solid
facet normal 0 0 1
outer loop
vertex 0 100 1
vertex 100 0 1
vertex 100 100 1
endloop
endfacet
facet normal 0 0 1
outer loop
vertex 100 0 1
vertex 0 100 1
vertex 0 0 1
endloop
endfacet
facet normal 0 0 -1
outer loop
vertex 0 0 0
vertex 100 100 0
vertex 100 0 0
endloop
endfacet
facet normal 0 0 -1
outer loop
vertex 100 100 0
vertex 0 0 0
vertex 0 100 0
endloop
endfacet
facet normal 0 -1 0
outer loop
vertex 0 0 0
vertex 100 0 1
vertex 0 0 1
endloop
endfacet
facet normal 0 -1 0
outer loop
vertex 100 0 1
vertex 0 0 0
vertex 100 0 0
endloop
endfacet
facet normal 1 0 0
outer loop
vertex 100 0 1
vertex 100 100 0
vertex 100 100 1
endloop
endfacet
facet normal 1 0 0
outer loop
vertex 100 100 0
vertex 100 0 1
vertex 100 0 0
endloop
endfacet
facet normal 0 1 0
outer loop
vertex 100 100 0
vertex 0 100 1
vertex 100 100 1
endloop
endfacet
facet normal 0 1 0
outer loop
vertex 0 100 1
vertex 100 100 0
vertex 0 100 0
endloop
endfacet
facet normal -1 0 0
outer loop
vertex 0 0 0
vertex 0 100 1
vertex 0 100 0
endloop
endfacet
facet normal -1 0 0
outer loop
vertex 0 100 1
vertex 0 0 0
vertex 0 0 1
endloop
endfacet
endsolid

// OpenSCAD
// ── HUEFORGE — IMPRESSÃO MULTI-COR COM IMAGEM ──
// Parâmetros injetados pelo backend
image_path     = is_undef(image_path)     ? ""    : image_path;
image_w        = is_undef(image_w)        ? 100   : image_w;
image_h        = is_undef(image_h)        ? 100   : image_h;
largura_mm     = is_undef(largura_mm)     ? 100   : largura_mm;
altura_mm      = is_undef(altura_mm)      ? 100   : altura_mm;
espessura_base = is_undef(espessura_base) ? 1.0   : espessura_base;
altura_relevo  = is_undef(altura_relevo)  ? 2.0   : altura_relevo;
// num_cores e layer_height usados apenas para o TXT, não para a geometria

scale_x = largura_mm / image_w;
scale_y = altura_mm  / image_h;
// O relevo vai de 0 (pixel=0, preto) até altura_relevo mm (pixel=255, branco)
scale_z = altura_relevo / 255;

union() {
    // Placa base sólida (dá suporte e garante a primeira cor)
    cube([largura_mm, altura_mm, espessura_base]);

    // Relevo da imagem quantizada por cima da base
    if (image_path != "") {
        translate([0, 0, espessura_base])
        scale([scale_x, scale_y, scale_z])
        surface(file = image_path, center = false, invert = false);
    }
}
